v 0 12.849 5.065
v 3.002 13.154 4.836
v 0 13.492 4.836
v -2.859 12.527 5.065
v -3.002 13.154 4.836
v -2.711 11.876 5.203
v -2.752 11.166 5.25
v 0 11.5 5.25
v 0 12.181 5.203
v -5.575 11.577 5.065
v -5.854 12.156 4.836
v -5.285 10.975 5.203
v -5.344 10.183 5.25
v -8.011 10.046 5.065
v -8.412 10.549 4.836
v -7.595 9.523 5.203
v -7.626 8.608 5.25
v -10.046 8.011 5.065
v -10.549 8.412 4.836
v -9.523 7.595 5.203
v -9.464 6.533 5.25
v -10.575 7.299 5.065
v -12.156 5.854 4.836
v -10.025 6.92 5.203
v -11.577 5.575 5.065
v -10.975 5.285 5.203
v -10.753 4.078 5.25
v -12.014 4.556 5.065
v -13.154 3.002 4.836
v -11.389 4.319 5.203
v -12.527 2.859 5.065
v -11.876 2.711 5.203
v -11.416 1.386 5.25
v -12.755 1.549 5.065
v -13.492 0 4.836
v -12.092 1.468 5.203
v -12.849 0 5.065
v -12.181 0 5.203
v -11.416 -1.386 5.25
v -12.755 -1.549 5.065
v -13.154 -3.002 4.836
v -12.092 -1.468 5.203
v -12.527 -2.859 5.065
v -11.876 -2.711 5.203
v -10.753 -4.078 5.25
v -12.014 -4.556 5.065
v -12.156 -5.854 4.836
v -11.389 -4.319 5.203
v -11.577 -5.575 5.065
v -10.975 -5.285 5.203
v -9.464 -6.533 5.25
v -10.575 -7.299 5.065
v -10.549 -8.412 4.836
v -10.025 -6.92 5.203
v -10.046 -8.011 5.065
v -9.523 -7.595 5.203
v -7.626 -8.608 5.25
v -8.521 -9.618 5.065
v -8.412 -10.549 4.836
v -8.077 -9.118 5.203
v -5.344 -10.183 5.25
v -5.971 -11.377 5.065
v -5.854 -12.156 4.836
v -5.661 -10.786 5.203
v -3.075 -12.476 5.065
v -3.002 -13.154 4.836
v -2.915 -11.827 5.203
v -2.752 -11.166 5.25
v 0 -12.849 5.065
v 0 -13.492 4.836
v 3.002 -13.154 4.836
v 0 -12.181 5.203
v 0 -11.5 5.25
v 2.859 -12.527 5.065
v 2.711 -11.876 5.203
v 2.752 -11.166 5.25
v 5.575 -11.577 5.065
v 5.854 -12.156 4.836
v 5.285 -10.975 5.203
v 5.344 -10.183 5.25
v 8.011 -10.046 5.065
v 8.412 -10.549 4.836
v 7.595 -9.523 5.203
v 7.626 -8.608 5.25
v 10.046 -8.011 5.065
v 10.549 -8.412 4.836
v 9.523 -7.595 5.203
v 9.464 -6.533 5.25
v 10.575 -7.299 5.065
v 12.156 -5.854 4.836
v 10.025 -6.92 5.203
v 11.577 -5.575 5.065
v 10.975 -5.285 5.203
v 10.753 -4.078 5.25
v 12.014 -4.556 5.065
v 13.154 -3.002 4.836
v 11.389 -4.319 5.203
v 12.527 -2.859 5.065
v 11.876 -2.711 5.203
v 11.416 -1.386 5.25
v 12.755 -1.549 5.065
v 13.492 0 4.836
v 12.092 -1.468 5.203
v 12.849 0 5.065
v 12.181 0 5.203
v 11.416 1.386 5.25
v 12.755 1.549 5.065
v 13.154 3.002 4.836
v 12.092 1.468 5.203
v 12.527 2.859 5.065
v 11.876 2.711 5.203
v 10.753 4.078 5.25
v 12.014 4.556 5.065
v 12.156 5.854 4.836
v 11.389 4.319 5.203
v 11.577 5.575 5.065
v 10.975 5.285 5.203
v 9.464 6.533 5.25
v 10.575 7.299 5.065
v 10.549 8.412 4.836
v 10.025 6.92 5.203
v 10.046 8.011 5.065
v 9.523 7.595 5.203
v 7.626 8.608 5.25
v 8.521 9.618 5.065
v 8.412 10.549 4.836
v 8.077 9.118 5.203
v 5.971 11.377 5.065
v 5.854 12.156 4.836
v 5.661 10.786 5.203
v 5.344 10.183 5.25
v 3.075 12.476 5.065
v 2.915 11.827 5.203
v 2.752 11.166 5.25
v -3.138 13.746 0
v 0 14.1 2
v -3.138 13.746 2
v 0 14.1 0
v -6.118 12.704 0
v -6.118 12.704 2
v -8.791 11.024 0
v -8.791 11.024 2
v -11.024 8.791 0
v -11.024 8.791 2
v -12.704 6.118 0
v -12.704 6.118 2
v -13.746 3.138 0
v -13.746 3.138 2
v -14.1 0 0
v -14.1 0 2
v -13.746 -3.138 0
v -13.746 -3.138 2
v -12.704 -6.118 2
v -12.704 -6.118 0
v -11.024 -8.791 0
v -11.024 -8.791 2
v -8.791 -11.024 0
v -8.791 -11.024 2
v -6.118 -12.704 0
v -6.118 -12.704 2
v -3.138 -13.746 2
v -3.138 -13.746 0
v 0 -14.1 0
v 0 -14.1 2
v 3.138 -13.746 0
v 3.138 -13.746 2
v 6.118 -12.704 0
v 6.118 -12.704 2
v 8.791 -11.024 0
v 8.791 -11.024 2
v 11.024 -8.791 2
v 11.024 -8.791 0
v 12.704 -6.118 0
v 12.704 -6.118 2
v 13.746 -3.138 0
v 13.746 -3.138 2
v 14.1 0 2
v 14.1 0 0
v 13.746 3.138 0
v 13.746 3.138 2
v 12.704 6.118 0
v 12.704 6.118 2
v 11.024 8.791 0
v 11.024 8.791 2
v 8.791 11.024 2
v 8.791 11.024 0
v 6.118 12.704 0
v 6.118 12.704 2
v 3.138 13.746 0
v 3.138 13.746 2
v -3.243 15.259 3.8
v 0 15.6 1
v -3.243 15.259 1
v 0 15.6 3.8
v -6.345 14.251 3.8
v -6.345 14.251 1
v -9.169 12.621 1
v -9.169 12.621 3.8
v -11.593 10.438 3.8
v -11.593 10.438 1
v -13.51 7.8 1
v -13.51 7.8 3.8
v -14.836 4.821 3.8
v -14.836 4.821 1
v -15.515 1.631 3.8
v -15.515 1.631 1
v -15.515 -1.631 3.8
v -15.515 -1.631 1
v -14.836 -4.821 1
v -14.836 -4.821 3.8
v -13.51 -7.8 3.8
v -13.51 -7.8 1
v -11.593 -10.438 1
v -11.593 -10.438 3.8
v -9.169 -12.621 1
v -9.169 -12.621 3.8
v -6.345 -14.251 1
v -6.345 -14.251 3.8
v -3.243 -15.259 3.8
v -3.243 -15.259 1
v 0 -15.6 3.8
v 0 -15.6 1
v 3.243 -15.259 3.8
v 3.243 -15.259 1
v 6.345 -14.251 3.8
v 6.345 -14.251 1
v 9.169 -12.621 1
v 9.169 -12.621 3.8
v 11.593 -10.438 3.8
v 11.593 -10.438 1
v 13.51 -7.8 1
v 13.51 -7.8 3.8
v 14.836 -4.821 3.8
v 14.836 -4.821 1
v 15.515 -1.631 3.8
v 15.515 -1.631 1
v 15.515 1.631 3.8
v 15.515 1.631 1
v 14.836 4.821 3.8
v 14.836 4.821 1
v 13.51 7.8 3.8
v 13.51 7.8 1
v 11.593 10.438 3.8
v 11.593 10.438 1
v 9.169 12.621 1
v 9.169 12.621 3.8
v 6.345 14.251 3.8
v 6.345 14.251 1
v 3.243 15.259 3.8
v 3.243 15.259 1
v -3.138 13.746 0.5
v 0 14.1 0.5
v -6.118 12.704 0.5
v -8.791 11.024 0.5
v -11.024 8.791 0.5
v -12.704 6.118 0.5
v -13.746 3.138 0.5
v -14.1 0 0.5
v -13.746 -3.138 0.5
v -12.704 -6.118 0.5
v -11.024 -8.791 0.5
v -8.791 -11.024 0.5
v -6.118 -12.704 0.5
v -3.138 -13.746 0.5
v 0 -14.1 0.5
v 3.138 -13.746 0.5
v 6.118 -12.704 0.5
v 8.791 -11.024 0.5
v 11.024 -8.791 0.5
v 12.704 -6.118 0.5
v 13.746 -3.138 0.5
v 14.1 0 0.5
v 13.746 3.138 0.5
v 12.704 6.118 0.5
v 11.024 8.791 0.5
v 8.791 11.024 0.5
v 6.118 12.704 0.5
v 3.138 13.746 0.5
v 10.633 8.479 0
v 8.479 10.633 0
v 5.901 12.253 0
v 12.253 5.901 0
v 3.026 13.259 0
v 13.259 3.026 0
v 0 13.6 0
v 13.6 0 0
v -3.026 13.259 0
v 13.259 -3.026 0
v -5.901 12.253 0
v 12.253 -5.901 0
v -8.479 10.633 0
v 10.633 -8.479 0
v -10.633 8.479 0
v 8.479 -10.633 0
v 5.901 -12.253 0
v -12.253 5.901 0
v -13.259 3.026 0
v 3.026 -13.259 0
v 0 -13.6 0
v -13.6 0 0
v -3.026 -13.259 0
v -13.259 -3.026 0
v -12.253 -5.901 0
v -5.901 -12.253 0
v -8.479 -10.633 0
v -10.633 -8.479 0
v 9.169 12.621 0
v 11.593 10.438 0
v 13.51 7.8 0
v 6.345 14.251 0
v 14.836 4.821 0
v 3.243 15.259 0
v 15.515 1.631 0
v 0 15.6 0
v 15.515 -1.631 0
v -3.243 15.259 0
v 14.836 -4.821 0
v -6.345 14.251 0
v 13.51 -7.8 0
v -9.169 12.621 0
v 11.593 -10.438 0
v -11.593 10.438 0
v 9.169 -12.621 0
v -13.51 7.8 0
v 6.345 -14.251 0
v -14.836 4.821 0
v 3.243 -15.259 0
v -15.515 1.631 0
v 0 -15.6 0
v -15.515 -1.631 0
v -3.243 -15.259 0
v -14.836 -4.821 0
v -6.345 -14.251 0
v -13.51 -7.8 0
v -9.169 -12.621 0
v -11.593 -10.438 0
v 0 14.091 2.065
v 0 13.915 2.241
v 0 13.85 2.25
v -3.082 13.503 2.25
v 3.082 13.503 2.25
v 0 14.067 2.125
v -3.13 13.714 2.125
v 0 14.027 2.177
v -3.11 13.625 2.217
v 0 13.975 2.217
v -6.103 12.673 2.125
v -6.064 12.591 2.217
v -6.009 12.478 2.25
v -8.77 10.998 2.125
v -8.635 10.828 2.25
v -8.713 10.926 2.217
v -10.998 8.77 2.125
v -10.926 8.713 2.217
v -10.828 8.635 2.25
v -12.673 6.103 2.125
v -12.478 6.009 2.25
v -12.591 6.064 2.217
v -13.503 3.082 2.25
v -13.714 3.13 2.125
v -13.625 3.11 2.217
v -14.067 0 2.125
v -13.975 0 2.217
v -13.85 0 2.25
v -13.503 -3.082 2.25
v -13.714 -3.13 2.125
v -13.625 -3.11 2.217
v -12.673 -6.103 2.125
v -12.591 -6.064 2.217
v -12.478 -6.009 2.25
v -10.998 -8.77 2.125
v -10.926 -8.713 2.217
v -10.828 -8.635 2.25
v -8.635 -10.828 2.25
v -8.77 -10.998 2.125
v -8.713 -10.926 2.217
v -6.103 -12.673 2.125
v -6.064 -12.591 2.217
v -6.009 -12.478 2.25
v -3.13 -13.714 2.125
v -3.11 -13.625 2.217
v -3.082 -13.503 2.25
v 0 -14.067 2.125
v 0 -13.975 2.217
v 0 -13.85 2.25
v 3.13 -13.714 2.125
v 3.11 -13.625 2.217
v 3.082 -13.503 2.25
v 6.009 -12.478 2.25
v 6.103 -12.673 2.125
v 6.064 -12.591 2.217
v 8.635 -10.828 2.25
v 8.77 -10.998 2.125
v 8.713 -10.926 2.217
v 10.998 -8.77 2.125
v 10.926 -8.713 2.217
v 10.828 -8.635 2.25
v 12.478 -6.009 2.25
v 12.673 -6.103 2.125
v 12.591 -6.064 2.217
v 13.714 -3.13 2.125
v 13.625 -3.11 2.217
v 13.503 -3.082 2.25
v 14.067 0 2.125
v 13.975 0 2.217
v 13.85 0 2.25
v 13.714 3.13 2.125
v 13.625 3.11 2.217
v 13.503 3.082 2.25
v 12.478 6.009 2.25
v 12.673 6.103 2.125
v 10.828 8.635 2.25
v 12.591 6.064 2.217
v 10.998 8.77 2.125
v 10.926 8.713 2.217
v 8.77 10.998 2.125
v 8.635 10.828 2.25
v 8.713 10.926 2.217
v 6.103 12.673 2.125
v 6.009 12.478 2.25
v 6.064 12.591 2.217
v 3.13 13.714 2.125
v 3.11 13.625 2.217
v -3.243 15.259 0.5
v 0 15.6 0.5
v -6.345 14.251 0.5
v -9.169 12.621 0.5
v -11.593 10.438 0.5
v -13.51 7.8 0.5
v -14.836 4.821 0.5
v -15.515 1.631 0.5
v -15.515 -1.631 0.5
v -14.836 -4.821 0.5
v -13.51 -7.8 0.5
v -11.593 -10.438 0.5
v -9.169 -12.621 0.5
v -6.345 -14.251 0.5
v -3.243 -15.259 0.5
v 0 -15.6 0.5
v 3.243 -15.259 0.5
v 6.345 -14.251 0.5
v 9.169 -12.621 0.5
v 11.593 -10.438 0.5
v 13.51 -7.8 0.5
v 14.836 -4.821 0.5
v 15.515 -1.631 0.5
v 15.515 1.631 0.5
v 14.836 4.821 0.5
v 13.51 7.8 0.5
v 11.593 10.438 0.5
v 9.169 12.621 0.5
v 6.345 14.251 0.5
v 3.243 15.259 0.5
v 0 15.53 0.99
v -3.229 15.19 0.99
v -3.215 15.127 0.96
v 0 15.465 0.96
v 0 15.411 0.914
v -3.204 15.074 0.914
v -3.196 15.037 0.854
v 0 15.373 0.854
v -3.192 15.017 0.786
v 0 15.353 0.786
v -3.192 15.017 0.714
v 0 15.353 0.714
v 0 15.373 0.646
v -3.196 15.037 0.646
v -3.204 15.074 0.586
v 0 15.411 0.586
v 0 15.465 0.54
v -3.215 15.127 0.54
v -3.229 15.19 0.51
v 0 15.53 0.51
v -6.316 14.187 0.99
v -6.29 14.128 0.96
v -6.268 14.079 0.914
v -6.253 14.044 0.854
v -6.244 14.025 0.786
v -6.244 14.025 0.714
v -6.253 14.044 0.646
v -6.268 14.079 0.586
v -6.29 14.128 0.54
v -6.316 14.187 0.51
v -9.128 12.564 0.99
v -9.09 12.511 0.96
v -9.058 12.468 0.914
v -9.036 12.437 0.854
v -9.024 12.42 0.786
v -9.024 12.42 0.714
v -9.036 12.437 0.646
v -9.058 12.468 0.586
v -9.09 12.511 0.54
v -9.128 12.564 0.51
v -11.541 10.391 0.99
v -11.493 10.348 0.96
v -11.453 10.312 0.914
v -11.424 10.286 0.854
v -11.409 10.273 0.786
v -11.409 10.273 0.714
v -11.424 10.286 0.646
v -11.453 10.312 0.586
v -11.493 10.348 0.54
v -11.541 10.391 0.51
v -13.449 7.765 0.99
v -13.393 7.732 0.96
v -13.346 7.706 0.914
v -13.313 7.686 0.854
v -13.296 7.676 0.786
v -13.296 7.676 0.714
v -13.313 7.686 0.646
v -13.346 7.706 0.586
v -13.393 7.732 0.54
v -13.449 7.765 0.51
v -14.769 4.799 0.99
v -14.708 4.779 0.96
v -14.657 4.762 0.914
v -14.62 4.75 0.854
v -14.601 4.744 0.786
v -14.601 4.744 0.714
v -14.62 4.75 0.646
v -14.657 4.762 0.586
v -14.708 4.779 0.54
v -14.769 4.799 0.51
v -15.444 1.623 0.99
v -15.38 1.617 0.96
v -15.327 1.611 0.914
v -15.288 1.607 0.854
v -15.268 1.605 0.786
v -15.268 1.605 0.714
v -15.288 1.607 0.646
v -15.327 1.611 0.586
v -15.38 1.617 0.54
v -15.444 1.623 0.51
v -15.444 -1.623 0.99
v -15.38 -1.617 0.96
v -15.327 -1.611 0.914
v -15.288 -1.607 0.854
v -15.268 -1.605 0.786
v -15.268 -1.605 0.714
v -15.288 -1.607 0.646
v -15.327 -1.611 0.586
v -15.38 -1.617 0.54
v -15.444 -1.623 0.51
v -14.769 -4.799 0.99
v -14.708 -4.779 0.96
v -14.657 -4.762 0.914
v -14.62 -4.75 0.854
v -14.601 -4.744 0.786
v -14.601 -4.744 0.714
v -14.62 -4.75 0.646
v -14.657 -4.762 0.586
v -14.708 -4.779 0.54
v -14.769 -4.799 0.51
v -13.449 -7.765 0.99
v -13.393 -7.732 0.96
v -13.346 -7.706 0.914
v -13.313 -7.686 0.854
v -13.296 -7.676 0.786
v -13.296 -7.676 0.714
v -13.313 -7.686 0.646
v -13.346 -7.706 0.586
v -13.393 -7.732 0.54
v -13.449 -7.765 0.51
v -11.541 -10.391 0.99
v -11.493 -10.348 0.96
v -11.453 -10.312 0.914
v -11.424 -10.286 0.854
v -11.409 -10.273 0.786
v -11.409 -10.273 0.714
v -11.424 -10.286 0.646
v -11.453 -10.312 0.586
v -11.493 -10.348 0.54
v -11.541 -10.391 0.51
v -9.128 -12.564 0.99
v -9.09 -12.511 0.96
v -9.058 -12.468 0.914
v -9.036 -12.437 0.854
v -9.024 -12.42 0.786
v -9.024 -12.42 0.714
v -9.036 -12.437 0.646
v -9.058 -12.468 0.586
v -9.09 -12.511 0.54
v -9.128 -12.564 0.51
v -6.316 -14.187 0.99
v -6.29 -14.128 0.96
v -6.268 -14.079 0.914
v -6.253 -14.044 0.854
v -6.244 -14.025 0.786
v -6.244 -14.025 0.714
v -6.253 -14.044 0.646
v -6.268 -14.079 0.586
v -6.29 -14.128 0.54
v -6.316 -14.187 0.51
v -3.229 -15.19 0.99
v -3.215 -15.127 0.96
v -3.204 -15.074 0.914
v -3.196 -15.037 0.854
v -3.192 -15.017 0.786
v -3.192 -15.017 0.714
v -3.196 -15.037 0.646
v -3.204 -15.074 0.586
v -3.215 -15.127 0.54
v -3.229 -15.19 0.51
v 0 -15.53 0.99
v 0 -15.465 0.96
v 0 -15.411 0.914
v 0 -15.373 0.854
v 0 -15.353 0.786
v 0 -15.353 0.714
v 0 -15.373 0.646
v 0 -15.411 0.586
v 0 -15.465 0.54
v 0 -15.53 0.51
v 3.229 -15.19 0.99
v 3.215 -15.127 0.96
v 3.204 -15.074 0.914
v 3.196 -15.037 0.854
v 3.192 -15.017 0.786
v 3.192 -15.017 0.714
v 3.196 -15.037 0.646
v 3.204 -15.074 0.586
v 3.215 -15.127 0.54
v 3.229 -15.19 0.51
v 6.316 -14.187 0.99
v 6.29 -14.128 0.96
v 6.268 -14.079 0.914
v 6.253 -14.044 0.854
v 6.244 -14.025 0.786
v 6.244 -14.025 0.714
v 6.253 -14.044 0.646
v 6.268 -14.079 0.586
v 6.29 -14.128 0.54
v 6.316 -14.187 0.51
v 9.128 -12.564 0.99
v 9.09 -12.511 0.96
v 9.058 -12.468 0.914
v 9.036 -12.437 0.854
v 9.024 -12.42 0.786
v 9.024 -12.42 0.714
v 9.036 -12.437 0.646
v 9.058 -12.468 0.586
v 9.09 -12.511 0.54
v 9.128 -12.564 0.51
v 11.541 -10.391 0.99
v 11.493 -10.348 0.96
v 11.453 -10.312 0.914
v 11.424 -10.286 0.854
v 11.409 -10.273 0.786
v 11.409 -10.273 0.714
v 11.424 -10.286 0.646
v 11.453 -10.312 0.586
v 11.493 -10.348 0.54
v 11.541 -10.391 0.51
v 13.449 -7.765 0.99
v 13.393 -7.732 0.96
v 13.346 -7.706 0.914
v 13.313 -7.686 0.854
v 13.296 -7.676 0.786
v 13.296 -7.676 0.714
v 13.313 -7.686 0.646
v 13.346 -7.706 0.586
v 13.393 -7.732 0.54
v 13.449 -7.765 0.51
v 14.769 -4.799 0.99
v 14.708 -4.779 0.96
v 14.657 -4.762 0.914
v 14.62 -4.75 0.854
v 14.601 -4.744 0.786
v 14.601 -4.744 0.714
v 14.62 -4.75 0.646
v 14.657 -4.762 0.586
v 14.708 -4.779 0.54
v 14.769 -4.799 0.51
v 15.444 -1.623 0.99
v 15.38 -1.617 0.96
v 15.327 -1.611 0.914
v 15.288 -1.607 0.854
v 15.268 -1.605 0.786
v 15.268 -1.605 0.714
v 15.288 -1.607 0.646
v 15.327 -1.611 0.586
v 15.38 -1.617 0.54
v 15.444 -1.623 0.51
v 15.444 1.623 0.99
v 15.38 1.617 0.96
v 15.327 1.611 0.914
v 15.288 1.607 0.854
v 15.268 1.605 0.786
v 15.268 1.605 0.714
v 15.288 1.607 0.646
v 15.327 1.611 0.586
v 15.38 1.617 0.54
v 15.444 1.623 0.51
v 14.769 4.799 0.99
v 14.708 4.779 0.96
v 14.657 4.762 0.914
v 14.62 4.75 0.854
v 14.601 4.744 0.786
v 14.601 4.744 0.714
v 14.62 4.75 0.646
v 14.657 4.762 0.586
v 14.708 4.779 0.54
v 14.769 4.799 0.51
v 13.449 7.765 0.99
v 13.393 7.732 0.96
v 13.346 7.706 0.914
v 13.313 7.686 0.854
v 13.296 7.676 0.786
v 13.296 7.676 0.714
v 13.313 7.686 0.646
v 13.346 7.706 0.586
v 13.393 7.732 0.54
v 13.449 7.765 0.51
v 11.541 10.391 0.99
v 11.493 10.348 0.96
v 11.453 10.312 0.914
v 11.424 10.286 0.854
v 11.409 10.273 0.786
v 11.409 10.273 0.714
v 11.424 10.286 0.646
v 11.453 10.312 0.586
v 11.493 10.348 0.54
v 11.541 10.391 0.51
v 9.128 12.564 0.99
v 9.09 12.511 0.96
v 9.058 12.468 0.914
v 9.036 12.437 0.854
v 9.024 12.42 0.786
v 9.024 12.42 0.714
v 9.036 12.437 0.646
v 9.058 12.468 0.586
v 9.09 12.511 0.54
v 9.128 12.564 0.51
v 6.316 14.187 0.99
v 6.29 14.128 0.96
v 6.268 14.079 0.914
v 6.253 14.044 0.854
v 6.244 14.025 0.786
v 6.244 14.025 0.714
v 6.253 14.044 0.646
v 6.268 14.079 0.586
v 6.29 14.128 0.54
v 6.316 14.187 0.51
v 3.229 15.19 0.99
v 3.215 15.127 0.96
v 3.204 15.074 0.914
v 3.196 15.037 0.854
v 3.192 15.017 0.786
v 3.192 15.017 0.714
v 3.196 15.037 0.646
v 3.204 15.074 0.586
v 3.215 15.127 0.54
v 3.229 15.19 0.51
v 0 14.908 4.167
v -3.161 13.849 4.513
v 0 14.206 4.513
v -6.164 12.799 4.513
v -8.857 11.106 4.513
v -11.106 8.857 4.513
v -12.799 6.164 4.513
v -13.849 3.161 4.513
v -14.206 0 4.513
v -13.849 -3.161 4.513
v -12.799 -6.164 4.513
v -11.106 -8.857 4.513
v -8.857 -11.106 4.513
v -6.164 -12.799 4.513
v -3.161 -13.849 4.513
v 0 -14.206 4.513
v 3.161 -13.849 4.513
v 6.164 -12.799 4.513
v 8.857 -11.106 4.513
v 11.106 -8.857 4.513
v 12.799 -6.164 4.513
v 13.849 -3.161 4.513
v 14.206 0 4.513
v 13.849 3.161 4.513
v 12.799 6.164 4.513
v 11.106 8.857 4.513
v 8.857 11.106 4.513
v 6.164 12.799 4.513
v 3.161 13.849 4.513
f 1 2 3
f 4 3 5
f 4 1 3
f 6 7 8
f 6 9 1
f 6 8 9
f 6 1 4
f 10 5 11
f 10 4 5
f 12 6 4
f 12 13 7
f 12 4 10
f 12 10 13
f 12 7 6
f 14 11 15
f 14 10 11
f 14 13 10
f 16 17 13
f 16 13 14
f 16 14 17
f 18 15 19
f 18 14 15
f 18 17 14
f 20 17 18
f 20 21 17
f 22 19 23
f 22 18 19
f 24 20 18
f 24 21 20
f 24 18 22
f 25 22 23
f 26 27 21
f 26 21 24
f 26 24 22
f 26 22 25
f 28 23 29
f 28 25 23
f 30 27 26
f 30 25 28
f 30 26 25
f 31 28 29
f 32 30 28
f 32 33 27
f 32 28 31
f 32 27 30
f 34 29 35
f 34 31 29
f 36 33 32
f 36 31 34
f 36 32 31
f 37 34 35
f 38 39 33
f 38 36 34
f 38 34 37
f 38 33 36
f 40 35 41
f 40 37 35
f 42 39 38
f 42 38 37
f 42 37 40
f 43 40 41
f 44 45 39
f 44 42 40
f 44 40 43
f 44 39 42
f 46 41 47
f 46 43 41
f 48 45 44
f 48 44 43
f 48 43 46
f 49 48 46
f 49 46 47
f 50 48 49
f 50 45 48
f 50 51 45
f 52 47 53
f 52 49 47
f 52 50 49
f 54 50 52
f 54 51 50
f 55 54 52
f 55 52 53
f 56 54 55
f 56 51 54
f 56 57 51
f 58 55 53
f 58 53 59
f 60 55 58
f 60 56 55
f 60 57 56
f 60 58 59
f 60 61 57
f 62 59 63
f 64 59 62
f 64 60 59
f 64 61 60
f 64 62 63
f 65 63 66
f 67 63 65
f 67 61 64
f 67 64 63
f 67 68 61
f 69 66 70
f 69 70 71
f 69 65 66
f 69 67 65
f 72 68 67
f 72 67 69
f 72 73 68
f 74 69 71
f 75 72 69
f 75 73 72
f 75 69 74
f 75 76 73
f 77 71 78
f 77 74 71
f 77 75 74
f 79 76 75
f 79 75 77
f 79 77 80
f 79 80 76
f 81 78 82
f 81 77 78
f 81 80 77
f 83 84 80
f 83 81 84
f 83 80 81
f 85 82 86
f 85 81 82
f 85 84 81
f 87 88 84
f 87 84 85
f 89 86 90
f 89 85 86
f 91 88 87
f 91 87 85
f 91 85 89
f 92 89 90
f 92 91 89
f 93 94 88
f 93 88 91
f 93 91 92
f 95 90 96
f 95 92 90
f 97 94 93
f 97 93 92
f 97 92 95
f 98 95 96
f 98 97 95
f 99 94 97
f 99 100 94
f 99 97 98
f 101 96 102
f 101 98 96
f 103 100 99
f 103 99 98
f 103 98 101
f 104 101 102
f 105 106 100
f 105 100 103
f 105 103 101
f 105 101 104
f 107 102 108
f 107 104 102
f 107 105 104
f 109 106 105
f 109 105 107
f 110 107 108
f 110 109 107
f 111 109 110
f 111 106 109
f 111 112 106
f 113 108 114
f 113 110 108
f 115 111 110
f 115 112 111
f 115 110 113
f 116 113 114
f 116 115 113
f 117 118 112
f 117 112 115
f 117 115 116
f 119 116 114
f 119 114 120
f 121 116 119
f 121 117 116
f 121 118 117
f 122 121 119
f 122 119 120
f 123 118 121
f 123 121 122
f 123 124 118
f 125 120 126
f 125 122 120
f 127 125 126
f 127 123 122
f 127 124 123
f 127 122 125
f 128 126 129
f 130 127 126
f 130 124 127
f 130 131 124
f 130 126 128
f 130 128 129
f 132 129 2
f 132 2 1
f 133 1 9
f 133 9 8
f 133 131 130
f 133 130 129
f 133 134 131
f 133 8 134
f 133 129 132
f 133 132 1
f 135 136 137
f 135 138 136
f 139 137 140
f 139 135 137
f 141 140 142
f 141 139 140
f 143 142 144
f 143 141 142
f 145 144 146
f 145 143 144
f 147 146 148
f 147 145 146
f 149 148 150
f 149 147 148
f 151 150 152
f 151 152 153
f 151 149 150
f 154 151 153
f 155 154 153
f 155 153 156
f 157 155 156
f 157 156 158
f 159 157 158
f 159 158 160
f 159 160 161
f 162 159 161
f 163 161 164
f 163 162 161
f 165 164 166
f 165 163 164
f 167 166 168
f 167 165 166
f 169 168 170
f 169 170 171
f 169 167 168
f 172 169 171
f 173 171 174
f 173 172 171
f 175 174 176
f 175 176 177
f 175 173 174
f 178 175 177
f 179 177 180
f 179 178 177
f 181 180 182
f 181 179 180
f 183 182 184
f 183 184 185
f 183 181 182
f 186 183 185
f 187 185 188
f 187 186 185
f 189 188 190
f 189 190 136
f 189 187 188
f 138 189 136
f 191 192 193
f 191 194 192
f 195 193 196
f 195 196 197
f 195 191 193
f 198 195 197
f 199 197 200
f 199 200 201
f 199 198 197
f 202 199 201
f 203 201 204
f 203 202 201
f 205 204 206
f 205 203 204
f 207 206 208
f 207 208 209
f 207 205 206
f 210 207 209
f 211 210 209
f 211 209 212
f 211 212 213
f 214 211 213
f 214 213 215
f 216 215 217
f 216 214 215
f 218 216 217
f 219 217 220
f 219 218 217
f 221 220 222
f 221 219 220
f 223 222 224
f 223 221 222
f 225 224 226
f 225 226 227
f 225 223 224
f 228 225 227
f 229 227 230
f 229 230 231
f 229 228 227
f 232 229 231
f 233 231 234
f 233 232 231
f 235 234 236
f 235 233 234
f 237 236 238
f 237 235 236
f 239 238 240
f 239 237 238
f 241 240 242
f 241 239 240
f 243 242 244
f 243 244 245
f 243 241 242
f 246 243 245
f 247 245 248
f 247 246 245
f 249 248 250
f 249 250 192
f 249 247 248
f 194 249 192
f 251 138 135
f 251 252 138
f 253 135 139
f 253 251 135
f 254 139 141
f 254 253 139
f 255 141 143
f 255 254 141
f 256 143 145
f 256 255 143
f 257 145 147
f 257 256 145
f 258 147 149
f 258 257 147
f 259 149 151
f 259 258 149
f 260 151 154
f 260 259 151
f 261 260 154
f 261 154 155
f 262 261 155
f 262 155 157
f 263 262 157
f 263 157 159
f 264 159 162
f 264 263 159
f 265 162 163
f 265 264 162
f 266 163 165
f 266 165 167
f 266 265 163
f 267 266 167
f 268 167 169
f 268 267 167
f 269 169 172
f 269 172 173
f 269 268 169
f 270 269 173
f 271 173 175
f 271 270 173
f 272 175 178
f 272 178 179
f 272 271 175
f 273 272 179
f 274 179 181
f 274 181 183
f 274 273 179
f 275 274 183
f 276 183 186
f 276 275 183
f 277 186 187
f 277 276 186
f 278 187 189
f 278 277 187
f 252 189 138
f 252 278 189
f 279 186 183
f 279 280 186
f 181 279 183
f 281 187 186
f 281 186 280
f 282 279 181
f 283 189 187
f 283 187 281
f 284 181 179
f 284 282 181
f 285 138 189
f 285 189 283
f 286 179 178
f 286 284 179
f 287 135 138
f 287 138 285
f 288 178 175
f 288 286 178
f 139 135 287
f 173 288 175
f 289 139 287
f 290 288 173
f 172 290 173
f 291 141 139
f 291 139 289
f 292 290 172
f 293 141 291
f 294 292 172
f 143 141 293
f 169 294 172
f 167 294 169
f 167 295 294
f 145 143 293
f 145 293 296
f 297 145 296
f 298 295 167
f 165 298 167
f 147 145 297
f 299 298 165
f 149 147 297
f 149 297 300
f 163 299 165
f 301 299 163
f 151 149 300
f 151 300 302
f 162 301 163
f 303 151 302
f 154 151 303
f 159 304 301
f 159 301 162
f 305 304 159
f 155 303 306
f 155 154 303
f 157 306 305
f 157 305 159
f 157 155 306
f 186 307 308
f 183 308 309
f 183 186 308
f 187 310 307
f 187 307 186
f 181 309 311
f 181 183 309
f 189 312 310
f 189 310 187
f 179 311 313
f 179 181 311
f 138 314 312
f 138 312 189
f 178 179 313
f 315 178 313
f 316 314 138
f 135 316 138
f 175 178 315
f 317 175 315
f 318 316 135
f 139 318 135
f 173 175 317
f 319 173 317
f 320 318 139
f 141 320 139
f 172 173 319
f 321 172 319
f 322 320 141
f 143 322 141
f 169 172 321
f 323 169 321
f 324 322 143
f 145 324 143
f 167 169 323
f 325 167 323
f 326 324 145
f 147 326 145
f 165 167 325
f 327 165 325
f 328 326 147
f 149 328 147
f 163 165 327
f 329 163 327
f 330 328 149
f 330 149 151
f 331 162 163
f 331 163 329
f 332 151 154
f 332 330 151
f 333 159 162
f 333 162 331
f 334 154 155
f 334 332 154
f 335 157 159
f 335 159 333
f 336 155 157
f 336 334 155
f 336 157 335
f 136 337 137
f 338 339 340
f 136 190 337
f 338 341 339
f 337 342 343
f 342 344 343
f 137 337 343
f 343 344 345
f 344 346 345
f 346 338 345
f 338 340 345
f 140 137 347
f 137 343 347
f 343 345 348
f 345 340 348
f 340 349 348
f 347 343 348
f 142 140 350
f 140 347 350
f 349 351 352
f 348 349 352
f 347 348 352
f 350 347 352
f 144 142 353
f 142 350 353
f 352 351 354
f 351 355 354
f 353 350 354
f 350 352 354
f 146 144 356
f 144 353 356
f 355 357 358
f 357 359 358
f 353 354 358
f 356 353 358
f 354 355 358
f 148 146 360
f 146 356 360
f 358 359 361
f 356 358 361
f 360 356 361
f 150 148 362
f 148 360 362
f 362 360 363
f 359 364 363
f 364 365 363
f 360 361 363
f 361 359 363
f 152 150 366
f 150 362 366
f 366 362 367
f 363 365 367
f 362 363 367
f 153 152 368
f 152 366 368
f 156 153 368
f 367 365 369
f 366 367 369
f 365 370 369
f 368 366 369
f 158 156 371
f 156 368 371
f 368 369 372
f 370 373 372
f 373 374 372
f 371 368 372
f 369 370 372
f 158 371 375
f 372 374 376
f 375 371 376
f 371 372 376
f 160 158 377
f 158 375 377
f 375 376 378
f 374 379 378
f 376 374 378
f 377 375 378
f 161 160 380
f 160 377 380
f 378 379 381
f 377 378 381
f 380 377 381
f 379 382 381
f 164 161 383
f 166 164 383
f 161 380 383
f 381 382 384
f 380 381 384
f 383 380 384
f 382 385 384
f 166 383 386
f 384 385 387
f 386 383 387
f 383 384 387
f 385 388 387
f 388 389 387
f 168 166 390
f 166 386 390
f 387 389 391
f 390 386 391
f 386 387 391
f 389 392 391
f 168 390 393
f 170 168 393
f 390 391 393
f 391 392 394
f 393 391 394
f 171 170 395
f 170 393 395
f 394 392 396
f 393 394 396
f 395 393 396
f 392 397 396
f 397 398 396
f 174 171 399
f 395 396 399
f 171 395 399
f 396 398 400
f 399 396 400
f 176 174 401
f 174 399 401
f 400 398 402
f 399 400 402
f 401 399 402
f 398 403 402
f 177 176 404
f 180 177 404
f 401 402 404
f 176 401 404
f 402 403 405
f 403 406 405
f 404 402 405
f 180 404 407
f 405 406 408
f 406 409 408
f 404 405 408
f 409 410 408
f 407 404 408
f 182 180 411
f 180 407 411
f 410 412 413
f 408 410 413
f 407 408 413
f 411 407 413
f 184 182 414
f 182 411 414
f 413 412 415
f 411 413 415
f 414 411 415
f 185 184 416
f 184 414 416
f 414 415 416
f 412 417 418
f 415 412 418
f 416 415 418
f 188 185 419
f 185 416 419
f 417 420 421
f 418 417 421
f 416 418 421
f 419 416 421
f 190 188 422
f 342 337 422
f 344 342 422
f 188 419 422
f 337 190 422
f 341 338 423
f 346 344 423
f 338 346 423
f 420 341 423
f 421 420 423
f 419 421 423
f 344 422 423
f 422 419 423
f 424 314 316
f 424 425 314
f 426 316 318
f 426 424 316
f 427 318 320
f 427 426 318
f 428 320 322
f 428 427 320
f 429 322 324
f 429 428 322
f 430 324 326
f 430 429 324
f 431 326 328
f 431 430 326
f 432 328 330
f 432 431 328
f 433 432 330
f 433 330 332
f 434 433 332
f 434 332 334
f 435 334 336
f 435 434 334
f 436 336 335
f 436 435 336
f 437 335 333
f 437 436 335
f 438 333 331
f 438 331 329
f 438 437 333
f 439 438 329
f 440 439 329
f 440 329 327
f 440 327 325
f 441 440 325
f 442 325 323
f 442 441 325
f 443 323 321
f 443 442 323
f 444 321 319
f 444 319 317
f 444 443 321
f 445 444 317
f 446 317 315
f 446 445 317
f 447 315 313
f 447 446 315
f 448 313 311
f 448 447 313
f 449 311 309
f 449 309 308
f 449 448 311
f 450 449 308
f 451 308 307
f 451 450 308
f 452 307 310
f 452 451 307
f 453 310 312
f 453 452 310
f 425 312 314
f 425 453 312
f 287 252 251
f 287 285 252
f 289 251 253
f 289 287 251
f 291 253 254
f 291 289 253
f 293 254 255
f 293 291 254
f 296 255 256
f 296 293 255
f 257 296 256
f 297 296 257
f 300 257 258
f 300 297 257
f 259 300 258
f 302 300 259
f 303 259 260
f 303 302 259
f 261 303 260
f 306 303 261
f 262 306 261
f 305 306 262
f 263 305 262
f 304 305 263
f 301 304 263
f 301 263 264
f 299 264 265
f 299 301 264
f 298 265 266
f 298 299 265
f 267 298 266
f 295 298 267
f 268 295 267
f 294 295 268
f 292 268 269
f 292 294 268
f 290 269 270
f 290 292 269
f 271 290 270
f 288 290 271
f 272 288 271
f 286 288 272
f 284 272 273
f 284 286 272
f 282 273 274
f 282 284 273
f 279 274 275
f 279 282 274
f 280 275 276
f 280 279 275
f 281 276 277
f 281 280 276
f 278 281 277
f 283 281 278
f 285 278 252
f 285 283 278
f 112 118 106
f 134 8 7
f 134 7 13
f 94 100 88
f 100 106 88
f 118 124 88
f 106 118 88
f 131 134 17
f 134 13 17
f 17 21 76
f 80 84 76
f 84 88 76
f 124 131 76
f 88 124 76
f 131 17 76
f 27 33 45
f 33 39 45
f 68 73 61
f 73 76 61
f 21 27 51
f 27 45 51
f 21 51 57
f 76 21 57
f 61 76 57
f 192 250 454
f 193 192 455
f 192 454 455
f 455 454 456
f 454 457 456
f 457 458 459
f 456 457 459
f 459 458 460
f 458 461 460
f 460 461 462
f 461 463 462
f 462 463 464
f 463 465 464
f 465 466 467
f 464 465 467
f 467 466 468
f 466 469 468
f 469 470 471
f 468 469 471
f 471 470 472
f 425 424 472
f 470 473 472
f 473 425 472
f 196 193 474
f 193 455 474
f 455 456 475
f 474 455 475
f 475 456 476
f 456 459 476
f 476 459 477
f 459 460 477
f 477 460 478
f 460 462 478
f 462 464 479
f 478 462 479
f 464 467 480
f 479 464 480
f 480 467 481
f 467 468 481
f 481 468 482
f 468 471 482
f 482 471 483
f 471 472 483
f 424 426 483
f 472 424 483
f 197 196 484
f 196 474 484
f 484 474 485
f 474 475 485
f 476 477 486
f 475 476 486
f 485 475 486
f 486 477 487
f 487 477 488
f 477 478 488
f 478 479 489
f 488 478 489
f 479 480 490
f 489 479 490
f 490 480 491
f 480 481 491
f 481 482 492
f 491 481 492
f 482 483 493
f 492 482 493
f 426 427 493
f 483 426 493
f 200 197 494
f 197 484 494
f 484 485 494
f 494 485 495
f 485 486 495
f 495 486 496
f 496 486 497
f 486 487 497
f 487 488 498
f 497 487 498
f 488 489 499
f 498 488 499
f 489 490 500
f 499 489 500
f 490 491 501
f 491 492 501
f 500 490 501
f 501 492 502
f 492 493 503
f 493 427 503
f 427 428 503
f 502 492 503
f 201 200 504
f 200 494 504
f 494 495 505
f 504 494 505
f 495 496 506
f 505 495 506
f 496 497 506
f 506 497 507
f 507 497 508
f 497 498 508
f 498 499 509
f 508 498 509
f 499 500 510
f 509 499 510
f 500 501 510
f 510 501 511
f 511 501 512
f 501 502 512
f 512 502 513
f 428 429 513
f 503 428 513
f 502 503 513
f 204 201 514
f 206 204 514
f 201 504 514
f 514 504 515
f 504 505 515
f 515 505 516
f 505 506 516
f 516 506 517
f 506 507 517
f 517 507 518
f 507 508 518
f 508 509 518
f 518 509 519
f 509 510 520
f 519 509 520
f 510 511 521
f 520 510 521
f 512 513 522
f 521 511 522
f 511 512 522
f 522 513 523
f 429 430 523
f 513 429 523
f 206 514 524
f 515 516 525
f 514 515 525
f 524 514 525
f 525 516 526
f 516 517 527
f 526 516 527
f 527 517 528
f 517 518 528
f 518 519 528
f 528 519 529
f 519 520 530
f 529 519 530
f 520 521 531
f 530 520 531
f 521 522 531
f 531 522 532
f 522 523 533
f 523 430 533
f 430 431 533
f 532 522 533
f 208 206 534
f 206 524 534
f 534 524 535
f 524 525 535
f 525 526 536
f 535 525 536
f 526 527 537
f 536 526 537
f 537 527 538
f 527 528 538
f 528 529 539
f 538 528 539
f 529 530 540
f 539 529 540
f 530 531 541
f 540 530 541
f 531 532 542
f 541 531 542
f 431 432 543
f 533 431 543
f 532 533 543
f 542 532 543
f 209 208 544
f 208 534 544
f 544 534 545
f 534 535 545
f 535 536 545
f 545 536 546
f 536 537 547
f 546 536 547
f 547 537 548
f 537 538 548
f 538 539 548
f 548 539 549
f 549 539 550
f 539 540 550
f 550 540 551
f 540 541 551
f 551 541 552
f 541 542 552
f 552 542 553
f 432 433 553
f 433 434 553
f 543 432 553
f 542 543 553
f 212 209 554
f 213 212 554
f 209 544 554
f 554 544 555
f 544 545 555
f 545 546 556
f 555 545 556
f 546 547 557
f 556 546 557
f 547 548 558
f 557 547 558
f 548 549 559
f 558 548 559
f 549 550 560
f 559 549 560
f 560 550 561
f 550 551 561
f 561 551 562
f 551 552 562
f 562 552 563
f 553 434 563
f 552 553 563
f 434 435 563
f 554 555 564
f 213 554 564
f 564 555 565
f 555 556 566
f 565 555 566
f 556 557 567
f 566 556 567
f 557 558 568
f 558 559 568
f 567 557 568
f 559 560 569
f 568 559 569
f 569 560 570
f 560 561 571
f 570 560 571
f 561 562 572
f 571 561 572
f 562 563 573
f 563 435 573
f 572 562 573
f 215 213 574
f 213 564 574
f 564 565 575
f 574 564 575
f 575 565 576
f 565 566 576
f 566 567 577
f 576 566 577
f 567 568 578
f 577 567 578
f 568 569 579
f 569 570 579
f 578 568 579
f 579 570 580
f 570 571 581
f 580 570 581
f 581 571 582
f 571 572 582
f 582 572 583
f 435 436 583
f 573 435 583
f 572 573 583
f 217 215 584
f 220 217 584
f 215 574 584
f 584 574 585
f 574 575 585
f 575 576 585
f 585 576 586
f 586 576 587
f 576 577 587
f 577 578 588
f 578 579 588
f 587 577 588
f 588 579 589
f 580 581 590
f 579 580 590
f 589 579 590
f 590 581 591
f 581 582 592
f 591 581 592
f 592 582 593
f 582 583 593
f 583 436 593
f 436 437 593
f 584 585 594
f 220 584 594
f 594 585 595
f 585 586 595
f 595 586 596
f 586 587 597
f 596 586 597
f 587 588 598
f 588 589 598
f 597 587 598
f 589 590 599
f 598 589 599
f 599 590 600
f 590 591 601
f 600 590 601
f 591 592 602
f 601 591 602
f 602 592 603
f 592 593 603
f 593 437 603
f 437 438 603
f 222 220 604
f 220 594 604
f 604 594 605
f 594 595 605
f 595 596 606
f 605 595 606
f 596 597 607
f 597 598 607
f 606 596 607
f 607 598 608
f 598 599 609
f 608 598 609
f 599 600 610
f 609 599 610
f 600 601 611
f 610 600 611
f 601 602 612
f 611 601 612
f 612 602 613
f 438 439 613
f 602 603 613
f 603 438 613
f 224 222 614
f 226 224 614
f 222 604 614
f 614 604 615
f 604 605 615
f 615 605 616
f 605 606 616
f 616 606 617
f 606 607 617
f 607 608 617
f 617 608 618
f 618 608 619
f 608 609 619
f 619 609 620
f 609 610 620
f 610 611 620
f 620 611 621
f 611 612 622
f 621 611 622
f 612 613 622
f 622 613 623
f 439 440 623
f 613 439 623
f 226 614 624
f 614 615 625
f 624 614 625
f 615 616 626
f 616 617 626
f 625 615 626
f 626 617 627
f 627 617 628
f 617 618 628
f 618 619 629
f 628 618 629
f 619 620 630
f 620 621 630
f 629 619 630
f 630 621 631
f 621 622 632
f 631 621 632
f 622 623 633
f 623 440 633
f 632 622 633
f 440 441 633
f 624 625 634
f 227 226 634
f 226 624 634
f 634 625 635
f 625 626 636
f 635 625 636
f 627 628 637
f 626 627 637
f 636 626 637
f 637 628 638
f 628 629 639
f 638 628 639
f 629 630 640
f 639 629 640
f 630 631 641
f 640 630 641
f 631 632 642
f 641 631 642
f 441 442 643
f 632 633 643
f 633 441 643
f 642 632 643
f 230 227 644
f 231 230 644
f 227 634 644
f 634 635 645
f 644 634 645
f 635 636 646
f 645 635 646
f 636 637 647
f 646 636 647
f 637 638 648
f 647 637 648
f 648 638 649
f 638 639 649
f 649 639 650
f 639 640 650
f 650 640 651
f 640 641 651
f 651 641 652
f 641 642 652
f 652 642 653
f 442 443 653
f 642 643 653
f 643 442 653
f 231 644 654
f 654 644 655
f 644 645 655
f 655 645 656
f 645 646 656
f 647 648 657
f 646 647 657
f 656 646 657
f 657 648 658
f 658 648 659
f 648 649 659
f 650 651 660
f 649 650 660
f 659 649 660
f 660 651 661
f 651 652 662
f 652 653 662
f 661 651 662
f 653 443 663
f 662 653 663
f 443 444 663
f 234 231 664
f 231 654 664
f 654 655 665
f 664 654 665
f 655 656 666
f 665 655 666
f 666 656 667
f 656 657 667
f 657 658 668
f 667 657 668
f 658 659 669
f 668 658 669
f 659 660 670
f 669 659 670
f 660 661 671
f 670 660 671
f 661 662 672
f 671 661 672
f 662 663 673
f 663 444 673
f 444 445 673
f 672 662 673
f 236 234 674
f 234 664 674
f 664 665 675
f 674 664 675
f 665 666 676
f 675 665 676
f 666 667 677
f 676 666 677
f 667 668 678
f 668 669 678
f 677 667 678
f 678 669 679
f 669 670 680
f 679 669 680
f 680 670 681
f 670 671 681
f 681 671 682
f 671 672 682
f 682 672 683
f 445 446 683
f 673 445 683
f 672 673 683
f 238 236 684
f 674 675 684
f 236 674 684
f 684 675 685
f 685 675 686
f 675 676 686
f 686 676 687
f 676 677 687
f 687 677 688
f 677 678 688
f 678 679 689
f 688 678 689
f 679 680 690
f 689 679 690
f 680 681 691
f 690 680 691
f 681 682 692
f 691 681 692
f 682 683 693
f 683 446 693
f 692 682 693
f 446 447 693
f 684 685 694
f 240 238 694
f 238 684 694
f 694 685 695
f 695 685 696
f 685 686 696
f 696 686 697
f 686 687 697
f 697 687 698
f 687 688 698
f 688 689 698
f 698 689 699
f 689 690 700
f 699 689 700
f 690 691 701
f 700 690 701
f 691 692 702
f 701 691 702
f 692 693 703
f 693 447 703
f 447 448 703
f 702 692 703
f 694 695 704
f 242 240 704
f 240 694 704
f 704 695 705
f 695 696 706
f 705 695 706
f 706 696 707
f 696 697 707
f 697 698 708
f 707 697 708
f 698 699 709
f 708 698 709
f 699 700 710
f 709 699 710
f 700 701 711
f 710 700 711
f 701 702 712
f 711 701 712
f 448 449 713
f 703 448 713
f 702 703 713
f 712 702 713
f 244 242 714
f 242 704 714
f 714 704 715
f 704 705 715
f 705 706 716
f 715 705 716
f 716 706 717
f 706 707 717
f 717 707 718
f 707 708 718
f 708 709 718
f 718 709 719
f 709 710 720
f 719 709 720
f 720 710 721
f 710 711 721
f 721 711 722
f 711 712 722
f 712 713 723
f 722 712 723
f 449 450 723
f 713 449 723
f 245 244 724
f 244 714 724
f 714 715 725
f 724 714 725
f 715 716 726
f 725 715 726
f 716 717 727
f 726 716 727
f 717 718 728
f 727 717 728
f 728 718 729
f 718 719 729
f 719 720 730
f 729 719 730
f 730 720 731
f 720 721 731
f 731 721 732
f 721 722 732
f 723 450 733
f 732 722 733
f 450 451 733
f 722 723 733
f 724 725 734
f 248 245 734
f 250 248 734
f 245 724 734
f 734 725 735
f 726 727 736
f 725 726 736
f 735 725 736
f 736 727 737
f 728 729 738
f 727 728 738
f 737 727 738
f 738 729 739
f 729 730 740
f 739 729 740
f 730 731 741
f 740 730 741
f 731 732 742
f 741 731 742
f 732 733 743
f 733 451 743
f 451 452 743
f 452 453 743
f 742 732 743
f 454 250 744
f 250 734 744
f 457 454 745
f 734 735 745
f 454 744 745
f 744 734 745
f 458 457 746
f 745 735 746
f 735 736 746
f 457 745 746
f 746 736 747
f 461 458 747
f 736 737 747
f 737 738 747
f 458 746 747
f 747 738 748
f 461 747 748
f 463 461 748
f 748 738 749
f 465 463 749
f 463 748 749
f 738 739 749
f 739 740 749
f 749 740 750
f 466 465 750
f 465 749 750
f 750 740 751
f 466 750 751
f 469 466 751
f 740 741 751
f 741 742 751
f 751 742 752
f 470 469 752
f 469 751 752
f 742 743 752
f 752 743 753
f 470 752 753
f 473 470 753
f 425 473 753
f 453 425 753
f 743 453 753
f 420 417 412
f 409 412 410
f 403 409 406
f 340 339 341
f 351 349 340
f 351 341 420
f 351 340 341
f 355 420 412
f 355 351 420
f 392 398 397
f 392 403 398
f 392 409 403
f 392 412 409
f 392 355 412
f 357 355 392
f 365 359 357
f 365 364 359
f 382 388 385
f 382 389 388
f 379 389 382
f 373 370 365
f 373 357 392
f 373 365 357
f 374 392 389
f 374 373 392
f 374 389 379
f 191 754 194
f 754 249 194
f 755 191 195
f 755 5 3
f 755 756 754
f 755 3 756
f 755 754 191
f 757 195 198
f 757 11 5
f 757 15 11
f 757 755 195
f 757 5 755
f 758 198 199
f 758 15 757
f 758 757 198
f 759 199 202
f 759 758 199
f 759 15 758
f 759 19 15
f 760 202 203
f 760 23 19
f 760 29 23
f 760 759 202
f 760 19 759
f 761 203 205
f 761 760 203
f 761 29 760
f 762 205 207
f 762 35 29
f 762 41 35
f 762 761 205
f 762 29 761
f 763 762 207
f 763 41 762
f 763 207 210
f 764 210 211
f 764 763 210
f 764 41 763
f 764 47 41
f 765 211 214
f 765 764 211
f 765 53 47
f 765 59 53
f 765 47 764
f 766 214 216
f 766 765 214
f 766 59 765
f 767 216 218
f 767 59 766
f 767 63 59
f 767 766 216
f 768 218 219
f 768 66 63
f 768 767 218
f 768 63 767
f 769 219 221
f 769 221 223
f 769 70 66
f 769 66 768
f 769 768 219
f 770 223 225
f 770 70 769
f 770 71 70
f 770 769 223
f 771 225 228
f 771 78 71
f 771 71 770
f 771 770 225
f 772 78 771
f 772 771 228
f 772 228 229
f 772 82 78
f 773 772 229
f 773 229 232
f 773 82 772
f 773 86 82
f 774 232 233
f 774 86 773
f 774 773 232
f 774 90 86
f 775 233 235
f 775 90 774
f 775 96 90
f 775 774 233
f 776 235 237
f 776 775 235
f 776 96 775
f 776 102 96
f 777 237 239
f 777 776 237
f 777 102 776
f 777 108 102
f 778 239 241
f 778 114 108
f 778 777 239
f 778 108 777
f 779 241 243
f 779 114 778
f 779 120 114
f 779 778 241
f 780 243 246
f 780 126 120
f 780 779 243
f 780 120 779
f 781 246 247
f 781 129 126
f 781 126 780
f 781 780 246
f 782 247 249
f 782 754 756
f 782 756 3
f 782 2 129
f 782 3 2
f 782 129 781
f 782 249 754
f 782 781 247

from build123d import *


with BuildPart() as crystal:
    # Sketch002 → Revolution001 (revolve)
    with BuildSketch(Plane.YZ):
        with BuildLine():
            Line((14.1, 2), (14.1, 0))
            Line((14.1, 0), (15.6, 0))
            Line((15.6, 0), (15.6, 0.5))
            ThreePointArc((15.6, 1), (15.35, 0.75), (15.6, 0.5))
            Line((15.6, 1), (15.6, 3.8))
            ThreePointArc((15.6, 3.8), (14.558314, 4.342731), (13.492285, 4.835935))
            ThreePointArc((13.492285, 4.835935), (12.517429, 5.145389), (11.5, 5.25))
            Line((0, 5.25), (11.5, 5.25))
            Line((0, 5.25), (0, 2.25))
            Line((0, 2.25), (13.85, 2.25))
            ThreePointArc((14.1, 2), (14.026777, 2.176777), (13.85, 2.25))
        make_face()
    revolve(axis=Axis((0, 0, 0), (0, 0, 1)))


with BuildPart() as tensionring:
    # Sketch → Revolution (revolve)
    with BuildSketch(Plane.YZ):
        Polygon((13.6, 0), (14.1, 0), (14.1, 0.5), align=None)
    revolve(axis=Axis((0, 0, 0), (0, 0, 1)))


solid = Compound([crystal.part, tensionring.part])
